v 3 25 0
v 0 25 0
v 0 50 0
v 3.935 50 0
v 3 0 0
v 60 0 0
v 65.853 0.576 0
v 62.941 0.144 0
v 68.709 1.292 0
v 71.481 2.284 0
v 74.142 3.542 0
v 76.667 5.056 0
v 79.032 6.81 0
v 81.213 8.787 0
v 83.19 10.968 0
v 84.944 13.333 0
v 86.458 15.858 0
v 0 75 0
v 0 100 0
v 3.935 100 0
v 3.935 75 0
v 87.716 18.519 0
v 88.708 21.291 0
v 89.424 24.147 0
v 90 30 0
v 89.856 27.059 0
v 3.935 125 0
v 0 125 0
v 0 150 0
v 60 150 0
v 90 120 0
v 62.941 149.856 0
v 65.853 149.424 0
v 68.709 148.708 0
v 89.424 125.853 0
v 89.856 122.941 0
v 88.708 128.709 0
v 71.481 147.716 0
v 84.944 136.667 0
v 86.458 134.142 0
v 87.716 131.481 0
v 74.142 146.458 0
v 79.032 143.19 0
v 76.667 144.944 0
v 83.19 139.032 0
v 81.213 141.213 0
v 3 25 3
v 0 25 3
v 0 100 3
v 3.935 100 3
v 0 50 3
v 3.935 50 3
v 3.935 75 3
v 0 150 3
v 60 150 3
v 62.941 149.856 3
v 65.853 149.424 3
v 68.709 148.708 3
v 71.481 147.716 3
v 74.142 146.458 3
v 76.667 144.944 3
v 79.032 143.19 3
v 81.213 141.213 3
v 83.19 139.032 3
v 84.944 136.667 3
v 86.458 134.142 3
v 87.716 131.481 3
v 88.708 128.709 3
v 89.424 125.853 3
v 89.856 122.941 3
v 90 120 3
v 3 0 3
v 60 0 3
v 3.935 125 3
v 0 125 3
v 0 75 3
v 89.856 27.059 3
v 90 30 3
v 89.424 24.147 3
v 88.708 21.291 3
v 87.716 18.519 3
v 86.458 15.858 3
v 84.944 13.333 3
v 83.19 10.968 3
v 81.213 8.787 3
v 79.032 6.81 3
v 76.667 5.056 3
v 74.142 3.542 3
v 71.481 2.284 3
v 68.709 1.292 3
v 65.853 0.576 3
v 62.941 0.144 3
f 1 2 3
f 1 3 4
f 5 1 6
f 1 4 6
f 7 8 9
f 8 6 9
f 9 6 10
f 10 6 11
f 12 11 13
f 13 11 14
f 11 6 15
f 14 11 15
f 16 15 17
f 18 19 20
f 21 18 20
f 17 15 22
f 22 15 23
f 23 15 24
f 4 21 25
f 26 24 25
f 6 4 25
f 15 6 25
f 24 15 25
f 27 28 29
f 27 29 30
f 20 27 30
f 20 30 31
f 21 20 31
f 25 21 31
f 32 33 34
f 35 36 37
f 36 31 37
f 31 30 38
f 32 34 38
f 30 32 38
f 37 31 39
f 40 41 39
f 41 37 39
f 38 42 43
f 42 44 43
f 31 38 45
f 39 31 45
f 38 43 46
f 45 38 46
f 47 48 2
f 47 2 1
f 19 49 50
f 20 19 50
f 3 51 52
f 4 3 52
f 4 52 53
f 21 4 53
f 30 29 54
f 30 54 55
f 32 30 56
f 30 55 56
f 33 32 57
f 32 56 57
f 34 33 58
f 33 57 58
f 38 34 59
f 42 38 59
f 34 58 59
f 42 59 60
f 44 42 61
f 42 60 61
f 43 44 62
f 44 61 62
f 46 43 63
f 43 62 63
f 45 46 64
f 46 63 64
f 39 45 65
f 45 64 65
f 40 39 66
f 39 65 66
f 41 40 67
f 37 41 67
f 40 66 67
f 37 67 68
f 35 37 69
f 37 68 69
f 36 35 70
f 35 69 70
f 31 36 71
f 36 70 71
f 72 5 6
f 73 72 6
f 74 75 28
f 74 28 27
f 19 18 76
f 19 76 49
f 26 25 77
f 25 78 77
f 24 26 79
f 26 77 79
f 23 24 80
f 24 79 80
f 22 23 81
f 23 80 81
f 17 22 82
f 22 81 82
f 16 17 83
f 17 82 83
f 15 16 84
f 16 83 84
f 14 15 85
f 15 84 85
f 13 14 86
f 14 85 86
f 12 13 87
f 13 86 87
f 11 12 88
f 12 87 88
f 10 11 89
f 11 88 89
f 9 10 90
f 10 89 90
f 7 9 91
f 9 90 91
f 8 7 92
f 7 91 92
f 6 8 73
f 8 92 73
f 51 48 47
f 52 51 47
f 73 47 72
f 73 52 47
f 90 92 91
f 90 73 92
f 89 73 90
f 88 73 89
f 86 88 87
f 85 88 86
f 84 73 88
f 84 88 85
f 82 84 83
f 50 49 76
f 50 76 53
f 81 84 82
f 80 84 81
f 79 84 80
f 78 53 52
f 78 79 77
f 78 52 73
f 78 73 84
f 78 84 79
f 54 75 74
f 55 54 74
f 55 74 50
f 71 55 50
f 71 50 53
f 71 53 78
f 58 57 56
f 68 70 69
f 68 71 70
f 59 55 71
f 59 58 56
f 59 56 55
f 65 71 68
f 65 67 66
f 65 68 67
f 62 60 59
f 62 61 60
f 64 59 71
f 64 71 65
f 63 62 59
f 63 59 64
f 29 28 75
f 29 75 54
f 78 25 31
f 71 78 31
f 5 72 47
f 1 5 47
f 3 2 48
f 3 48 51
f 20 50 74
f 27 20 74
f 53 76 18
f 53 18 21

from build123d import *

# Parameters (mm, degrees)
ESQUISSE1_W             = 90
ESQUISSE1_H             = 150
BOSS_EXTRU_2_DEPTH      = 3
ESQUISSE3_W             = 3.935197626
ESQUISSE3_H             = 25
ESQUISSE3_W_2           = 3
ENL_V_MAT_EXTRU_1_DEPTH = 3
CONG_1_R                = 30


with BuildPart() as part:
    # Esquisse1 → Boss.-Extru.2 (new body)
    with BuildSketch(Plane.XY):
        with Locations((45, 75)):
            Rectangle(ESQUISSE1_W, ESQUISSE1_H)
    extrude(amount=BOSS_EXTRU_2_DEPTH)

    # Esquisse3 → Enlèv. mat.-Extru.1 (cut)
    with BuildSketch(Plane.XY.offset(3)):
        with Locations((1.967598813, 112.5)):
            Rectangle(ESQUISSE3_W, ESQUISSE3_H)
        with Locations((1.967598813, 62.5)):
            Rectangle(ESQUISSE3_W, ESQUISSE3_H)
        with Locations((1.5, 12.5)):
            Rectangle(ESQUISSE3_W_2, ESQUISSE3_H)
    extrude(amount=-ENL_V_MAT_EXTRU_1_DEPTH, mode=Mode.SUBTRACT)

    # Congé1
    cong_1_edges = [part.edges().sort_by_distance(p)[0] for p in [
        (90, 0, 1.5),
        (90, 150, 1.5),
    ]]
    fillet(cong_1_edges, radius=CONG_1_R)


solid = part.part
